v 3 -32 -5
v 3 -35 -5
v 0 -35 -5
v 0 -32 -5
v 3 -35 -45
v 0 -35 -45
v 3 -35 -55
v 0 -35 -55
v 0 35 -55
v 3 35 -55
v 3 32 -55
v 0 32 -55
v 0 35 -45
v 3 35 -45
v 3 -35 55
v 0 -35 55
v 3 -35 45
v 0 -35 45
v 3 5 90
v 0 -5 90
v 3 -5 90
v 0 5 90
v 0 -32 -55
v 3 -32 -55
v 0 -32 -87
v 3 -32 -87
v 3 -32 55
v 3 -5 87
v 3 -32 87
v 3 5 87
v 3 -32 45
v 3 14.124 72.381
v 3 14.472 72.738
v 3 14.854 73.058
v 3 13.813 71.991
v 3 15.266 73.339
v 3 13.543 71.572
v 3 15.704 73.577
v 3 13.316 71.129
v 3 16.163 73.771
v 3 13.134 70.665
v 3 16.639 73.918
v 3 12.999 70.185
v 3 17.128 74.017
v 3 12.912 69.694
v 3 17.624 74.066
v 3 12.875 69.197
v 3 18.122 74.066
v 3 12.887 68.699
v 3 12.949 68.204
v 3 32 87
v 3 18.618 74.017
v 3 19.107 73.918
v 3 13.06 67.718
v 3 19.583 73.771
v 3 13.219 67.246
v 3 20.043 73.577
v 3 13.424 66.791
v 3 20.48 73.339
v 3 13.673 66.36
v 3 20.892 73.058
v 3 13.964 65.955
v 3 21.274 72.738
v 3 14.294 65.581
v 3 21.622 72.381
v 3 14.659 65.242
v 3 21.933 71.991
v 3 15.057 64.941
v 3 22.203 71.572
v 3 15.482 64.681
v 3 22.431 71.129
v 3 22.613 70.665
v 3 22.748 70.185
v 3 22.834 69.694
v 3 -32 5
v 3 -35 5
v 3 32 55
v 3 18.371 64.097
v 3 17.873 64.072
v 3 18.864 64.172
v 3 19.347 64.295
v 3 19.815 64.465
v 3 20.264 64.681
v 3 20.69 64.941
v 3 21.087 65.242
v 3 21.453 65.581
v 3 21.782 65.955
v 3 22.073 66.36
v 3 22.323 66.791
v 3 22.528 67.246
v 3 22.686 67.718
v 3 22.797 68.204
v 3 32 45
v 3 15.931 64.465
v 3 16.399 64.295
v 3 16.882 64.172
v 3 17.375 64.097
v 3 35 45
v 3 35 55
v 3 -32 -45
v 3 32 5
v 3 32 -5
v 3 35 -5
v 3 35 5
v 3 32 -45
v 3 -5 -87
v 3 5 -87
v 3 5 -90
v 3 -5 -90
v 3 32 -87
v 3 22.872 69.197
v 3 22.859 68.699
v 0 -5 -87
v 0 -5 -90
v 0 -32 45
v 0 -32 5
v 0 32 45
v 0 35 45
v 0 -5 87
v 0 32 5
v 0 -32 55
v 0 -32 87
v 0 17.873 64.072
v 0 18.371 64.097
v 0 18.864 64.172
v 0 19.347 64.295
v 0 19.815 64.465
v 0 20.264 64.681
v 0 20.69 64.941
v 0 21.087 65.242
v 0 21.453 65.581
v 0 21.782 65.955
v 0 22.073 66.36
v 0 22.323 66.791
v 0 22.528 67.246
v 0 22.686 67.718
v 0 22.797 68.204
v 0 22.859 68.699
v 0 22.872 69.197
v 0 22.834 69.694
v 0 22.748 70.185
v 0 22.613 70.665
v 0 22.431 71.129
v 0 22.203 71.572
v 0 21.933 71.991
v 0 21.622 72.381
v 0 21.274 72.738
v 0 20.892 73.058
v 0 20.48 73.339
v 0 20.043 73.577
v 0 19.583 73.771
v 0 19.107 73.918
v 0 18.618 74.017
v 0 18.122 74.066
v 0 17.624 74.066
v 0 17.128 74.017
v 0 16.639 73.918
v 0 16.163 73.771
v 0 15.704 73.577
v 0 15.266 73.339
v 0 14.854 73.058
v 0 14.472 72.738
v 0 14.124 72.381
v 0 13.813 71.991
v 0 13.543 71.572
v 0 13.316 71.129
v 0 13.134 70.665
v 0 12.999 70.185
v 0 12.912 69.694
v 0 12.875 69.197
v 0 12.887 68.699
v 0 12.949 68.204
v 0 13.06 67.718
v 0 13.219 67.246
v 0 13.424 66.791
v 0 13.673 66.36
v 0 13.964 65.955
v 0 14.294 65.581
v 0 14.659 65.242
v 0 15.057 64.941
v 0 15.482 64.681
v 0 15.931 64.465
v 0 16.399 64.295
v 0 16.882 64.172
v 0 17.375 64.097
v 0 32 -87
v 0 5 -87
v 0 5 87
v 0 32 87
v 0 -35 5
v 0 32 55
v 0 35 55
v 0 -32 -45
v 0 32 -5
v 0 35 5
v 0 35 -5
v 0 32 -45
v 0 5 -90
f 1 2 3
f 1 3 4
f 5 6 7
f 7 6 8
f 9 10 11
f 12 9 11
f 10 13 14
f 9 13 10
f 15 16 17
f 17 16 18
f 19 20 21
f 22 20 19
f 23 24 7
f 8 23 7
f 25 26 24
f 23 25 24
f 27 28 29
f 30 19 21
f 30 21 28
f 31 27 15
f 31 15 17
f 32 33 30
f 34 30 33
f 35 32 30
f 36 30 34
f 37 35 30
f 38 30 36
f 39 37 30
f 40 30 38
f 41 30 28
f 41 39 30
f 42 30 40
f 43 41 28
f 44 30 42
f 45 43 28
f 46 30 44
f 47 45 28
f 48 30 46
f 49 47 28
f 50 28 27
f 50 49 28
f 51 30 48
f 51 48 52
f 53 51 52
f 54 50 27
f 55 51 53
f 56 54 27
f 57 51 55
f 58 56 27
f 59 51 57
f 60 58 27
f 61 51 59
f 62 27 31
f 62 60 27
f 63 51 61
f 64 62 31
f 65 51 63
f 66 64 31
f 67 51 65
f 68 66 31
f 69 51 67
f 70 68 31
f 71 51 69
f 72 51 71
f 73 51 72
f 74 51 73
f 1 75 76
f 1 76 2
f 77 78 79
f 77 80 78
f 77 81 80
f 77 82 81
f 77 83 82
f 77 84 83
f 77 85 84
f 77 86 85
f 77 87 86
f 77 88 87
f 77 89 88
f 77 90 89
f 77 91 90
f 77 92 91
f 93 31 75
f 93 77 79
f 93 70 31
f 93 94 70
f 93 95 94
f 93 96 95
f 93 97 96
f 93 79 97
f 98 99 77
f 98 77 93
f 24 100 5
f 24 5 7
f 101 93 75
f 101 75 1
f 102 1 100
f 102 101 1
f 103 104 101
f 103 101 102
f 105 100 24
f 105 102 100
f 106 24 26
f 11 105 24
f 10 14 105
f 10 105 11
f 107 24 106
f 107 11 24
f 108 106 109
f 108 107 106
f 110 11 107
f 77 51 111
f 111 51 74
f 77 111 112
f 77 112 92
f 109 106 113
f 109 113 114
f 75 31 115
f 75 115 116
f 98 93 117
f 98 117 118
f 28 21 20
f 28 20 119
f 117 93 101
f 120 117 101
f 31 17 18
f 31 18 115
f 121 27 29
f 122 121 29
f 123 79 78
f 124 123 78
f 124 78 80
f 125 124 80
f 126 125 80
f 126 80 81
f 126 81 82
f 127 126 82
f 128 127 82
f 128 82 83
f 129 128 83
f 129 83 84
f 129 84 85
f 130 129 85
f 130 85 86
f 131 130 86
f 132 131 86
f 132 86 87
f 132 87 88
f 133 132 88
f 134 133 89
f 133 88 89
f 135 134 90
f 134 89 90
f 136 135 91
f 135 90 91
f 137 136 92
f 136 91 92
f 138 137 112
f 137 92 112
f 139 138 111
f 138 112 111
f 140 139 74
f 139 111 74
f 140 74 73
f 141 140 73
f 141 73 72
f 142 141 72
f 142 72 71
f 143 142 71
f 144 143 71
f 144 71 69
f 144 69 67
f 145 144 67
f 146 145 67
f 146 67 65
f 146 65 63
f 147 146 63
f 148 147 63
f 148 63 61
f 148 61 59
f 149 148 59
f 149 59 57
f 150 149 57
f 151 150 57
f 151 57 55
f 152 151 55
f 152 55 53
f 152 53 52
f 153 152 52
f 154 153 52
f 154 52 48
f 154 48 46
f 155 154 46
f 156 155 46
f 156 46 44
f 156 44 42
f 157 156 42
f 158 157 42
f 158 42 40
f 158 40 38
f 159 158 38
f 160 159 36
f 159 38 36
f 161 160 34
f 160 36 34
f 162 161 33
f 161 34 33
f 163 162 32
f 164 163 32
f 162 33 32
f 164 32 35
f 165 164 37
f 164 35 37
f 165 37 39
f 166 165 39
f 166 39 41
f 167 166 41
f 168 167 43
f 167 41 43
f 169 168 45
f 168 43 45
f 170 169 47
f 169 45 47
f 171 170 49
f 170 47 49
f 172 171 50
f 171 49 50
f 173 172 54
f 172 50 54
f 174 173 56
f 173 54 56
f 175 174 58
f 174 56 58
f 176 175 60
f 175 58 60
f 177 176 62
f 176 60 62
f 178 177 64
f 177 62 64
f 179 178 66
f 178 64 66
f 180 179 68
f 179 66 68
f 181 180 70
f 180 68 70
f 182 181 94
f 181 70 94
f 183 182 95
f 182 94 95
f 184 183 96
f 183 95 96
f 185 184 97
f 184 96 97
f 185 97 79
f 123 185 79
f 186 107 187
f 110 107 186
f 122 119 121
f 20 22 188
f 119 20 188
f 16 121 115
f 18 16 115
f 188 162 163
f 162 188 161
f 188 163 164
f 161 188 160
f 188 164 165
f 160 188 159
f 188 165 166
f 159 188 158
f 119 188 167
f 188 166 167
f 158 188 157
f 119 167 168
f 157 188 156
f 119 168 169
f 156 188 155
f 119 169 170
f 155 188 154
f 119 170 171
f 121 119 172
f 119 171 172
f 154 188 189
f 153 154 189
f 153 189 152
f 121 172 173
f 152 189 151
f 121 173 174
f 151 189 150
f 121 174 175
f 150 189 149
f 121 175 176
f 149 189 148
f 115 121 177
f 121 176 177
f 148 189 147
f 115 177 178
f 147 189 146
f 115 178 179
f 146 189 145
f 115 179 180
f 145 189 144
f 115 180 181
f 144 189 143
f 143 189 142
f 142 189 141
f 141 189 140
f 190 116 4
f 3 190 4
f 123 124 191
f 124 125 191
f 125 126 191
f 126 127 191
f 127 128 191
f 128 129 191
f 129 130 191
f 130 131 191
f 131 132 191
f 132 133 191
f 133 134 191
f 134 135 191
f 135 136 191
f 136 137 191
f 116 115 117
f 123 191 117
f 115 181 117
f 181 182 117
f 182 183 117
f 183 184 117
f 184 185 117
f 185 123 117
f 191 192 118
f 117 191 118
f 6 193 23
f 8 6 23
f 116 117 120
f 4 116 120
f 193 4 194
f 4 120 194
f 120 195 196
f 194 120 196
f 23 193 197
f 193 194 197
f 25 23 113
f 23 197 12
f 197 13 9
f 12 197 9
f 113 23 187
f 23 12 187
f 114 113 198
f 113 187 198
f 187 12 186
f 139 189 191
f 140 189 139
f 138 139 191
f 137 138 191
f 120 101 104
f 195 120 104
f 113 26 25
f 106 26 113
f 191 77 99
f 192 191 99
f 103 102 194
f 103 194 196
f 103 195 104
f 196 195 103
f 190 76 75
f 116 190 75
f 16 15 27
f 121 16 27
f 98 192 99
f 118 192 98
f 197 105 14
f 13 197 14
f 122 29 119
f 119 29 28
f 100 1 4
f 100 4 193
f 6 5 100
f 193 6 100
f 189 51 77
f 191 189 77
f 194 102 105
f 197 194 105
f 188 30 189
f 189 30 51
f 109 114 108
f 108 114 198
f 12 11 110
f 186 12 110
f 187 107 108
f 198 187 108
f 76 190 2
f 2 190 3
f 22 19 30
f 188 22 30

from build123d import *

# Parameters (mm, degrees)
SKETCH1_W           = 180
SKETCH1_H           = 70
BOSS_EXTRUDE1_DEPTH = 3
SKETCH2_W           = 3
SKETCH2_H           = 27
SKETCH2_W_2         = 40
SKETCH2_H_2         = 3
CUT_EXTRUDE6_DEPTH  = 10
SKETCH3_R           = 5
CUT_EXTRUDE7_DEPTH  = 12


with BuildPart() as part:
    # Sketch1 → Boss-Extrude1 (new body)
    with BuildSketch(Plane(origin=(0, 0, 0), x_dir=(0, 0, -1), z_dir=(1, 0, 0))):
        Rectangle(SKETCH1_W, SKETCH1_H)
    extrude(amount=BOSS_EXTRUDE1_DEPTH)

    # Sketch2 → Cut-Extrude6 (cut)
    with BuildSketch(Plane(origin=(3, 0, 0), x_dir=(0, 0, -1), z_dir=(1, 0, 0))):
        Polygon((90, -32), (87, -32), (55, -32), (55, -35), (90, -35), align=None)
        with Locations((88.5, -18.5)):
            Rectangle(SKETCH2_W, SKETCH2_H)
        with Locations((25, -33.5)):
            Rectangle(SKETCH2_W_2, SKETCH2_H_2)
        with Locations((-25, -33.5)):
            Rectangle(SKETCH2_W_2, SKETCH2_H_2)
        Polygon((-55, -32), (-87, -32), (-90, -32), (-90, -35), (-55, -35), align=None)
        with Locations((-88.5, -18.5)):
            Rectangle(SKETCH2_W, SKETCH2_H)
        with Locations((-88.5, 18.5)):
            Rectangle(SKETCH2_W, SKETCH2_H)
        Polygon((-87, 32), (-55, 32), (-55, 35), (-90, 35), (-90, 32), align=None)
        with Locations((-25, 33.5)):
            Rectangle(SKETCH2_W_2, SKETCH2_H_2)
        with Locations((25, 33.5)):
            Rectangle(SKETCH2_W_2, SKETCH2_H_2)
        Polygon((55, 32), (87, 32), (90, 32), (90, 35), (55, 35), align=None)
        with Locations((88.5, 18.5)):
            Rectangle(SKETCH2_W, SKETCH2_H)
    extrude(amount=-CUT_EXTRUDE6_DEPTH, mode=Mode.SUBTRACT)

    # Sketch3 → Cut-Extrude7 (cut)
    with BuildSketch(Plane(origin=(3, 0, 0), x_dir=(0, 0, -1), z_dir=(1, 0, 0))):
        with Locations((-69.072414396, 17.873185396)):
            Circle(SKETCH3_R)
    extrude(amount=-CUT_EXTRUDE7_DEPTH, mode=Mode.SUBTRACT)


solid = part.part
